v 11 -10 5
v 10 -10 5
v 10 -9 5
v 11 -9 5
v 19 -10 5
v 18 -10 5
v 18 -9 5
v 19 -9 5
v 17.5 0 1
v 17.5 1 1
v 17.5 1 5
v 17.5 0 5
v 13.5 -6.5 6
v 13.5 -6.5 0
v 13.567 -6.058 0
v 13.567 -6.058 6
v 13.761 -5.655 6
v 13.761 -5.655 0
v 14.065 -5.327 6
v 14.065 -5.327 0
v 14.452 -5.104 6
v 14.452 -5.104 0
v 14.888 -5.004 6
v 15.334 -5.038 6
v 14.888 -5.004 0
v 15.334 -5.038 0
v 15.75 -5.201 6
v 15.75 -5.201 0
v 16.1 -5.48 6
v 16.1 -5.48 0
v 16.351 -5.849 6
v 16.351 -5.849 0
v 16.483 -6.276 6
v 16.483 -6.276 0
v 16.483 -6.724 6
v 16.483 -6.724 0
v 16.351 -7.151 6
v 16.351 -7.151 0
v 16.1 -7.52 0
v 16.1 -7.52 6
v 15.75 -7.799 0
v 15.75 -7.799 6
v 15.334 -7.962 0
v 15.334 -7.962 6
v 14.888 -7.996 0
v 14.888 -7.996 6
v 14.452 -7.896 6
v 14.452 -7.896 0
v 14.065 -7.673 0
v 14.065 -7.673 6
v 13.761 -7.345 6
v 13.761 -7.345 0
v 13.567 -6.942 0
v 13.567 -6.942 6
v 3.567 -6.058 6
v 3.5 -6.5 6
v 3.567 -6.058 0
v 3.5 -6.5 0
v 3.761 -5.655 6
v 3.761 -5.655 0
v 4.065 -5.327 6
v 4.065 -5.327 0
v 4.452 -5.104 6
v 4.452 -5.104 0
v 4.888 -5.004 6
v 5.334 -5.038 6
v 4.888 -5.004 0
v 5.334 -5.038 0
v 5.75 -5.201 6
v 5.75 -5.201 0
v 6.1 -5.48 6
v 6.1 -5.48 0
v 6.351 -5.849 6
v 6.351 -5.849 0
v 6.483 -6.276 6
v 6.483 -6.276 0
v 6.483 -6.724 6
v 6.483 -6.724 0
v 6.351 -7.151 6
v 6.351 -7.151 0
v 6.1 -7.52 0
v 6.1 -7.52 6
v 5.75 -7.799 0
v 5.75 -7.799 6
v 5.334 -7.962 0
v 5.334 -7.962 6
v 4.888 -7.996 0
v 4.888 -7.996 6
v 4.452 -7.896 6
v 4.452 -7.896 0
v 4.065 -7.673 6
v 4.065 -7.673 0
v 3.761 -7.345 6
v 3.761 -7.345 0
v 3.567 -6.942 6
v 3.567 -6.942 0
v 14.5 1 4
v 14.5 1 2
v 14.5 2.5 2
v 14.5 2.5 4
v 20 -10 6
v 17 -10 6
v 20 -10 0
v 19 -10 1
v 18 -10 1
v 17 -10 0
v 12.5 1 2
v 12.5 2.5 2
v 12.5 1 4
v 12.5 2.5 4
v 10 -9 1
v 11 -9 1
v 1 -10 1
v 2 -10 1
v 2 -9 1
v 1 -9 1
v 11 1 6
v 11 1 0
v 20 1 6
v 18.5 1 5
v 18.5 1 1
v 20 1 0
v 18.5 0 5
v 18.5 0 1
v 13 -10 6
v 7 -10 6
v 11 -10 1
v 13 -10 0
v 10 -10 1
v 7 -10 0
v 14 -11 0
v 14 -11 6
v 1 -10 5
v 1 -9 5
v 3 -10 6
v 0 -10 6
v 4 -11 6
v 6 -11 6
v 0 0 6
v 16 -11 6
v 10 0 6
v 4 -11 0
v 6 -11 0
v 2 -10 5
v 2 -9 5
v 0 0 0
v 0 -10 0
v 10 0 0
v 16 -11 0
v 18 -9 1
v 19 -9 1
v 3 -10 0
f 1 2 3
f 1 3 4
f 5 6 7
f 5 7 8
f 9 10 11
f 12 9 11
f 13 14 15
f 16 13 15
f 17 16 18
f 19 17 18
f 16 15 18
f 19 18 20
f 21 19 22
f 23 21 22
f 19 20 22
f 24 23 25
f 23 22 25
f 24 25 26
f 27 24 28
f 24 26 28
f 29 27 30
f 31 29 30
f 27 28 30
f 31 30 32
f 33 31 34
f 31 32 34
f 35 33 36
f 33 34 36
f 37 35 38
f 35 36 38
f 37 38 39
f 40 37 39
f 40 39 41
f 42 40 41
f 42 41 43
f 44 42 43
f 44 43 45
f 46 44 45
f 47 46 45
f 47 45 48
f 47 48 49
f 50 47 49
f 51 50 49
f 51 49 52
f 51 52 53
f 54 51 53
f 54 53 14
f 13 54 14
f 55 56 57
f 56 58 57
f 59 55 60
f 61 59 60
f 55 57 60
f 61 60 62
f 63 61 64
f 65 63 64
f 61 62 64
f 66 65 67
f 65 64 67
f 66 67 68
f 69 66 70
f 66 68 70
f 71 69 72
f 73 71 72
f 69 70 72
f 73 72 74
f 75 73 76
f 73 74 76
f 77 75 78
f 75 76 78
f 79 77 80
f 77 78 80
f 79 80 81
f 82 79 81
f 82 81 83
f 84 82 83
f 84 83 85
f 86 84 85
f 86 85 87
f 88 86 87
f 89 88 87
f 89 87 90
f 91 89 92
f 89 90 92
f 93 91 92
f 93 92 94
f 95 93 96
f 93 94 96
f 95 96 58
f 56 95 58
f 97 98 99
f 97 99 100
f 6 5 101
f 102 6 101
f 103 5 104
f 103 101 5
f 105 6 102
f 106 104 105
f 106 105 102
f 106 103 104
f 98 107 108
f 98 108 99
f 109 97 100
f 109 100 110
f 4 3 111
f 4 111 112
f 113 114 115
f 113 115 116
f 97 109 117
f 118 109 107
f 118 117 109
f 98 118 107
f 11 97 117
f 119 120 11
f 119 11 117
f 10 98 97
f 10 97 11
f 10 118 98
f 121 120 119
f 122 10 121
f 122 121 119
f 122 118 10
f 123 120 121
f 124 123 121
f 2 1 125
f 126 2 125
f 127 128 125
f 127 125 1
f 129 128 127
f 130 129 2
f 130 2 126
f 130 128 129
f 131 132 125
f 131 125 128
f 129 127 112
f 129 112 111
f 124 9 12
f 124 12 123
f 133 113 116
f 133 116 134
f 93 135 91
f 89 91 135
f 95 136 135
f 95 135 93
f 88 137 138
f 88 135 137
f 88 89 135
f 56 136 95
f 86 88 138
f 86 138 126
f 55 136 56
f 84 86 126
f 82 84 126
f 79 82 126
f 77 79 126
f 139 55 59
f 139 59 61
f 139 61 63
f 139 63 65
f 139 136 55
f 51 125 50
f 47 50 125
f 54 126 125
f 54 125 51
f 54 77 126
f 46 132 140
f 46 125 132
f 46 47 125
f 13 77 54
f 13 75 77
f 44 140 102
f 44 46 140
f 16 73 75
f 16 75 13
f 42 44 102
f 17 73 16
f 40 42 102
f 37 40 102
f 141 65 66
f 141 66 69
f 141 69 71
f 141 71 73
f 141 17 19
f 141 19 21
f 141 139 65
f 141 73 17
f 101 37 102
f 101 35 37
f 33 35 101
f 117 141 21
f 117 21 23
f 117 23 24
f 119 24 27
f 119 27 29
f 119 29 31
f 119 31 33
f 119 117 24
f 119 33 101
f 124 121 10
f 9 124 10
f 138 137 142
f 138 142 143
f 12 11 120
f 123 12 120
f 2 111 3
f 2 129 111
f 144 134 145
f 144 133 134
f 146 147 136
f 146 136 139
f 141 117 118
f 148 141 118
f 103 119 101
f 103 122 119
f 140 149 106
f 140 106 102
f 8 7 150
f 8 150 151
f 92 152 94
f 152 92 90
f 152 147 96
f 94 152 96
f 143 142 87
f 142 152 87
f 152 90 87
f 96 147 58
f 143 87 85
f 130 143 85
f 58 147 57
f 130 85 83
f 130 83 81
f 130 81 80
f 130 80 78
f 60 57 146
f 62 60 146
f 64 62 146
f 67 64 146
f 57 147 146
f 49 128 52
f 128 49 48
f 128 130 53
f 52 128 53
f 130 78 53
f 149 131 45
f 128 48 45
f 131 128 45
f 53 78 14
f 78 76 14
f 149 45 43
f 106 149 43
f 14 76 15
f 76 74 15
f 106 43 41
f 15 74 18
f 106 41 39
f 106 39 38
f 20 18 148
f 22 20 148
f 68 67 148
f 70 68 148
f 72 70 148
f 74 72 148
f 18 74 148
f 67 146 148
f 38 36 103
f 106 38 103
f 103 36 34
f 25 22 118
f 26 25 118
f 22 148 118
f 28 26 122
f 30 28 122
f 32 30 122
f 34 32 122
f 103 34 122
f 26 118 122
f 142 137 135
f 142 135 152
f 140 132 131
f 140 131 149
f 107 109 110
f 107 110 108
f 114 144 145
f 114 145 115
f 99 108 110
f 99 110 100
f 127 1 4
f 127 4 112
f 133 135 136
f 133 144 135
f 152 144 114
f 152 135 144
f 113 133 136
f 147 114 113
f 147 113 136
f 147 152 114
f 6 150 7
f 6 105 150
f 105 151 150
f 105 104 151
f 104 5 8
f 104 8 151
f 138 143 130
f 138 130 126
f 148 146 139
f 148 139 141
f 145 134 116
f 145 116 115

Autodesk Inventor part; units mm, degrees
ref_plane "YZ Plane" through (0, 0, 0) normal (1, 0, 0) x (0, 1, 0)
ref_plane "XZ Plane" through (0, 0, 0) normal (0, 1, 0) x (-1, 0, 0)
ref_plane "XY Plane" through (0, 0, 0) normal (0, 0, 1) x (1, 0, 0)
sketch "Sketch1" plane through (0, 0, 0) normal (0, 0, 1) x (1, 0, 0)
  line L0 (0, 0) -> (20, 0)
  line L1 (20, 0) -> (20, -10)
  line L2 (20, -10) -> (0, -10)
  line L3 (0, -10) -> (0, 0)
  dimension "d0" = 20
  dimension "d1" = 10
extrude "Extrusion1" add sketch "Sketch1" along normal blind 6
sketch "Sketch2" plane through (0, 0, 0) normal (0, 1, 0) x (1, 0, 0)
  line L0 (20, 0) -> (20, -6) projected
  line L1 (20, 0) -> (10, 0)
  line L2 (10, 0) -> (10, -6)
  line L3 (10, -6) -> (20, -6)
  line L4 (20, -6) -> (20, 0)
  point P0 (0, 0)
  dimension "d4" = 10
extrude "Extrusion2" add sketch "Sketch2" along normal blind 1
chamfer "Chamfer2" distance 1 angle 45 1 edges at (10, 1, 3)
sketch "Sketch3" plane through (0, -10, 0) normal (0, -1, 0) x (1, 0, 0)
  line L0 (0, 6) -> (3, 6) construction
  line L1 (3, 6) -> (3, 0) construction
  line L2 (3, 0) -> (0, 0) construction
  line L3 (0, 0) -> (0, 6) construction
  line L4 (3, 6) -> (7, 6)
  line L5 (7, 6) -> (7, 0)
  line L6 (7, 0) -> (3, 0)
  line L7 (3, 0) -> (3, 6)
  line L8 (7, 6) -> (13, 6) construction
  line L9 (13, 6) -> (13, 0) construction
  line L10 (13, 0) -> (7, 0) construction
  line L11 (7, 0) -> (7, 6) construction
  line L12 (13, 6) -> (17, 6)
  line L13 (17, 6) -> (17, 0)
  line L14 (17, 0) -> (13, 0)
  line L15 (13, 0) -> (13, 6)
  dimension "d13" = 3
  dimension "d14" = 4
  dimension "d15" = 6
  dimension "d16" = 4
extrude "Extrusion3" add sketch "Sketch3" along normal blind 1
chamfer "Chamfer3" distance 1 angle 45 4 edges at (3, -11, 3) (7, -11, 3) (13, -11, 3) (17, -11, 3)
sketch "Sketch4" plane through (0, -10, 0) normal (0, -1, 0) x (1, 0, 0)
  line L0 (0, 6) -> (2.9323, 6) construction
  line L1 (0, 5) -> (2.9323, 5) construction
  line L2 (0, 0) -> (2.9323, 0) construction
  line L3 (2.9323, 1) -> (1, 1) construction
  line L4 (1, 1) -> (1, 5) construction
  line L5 (1, 5) -> (2.9323, 5) construction
  line L6 (2, 5) -> (2, 1) construction
  line L7 (1, 5) -> (2, 5)
  line L8 (2, 5) -> (2, 1)
  line L9 (2, 1) -> (1, 1)
  line L10 (1, 1) -> (1, 5)
  dimension "d22" = 1
  dimension "d23" = 1
  dimension "d24" = 1
extrude "Extrusion4" cut sketch "Sketch4" against normal blind 1
sketch "Sketch5" plane through (7, -10, 0) normal (0, -1, 0) x (1, 0, 0)
  line L0 (0, 0.2008) -> (0, 5.4827) construction
  line L1 (3, 0.2008) -> (3, 5.4827) construction
  line L2 (4, 0.2008) -> (4, 5.4827) construction
  line L3 (6, 0) -> (0.2208, 0) construction
  line L4 (6, 1) -> (0.2208, 1) construction
  line L5 (6, 6) -> (0.5976, 6) construction
  line L6 (6, 5) -> (0.5976, 5) construction
  line L7 (4, 1) -> (3, 1)
  line L8 (3, 1) -> (3, 5)
  line L9 (3, 5) -> (4, 5)
  line L10 (4, 5) -> (4, 1)
  point P0 (-7, 0)
  dimension "d27" = 3
  dimension "d28" = 1
  dimension "d29" = 1
  dimension "d30" = 1
extrude "Extrusion5" cut sketch "Sketch5" against normal blind 1
sketch "Sketch6" plane through (20, -10, 0) normal (0, -1, 0) x (1, 0, 0)
  line L0 (0, 0) -> (0, 5.7185) construction
  line L1 (-1, 0) -> (-1, 5.7185) construction
  line L2 (-2, 0) -> (-2, 5.7185) construction
  line L3 (-0.3844, 0) -> (-2.7356, 0) construction
  line L4 (-0.3844, 1) -> (-2.7356, 1) construction
  line L5 (-0.4485, 6) -> (-2.495, 6) construction
  line L6 (-0.4485, 5) -> (-2.495, 5) construction
  line L7 (-1, 1) -> (-2, 1)
  line L8 (-2, 1) -> (-2, 5)
  line L9 (-2, 5) -> (-1, 5)
  line L10 (-1, 5) -> (-1, 1)
  point P0 (-20, 0)
  dimension "d33" = 1
  dimension "d34" = 1
  dimension "d35" = 1
  dimension "d36" = 1
extrude "Extrusion6" cut sketch "Sketch6" against normal blind 1
sketch "Sketch7" plane through (0, 1, 0) normal (0, 1, 0) x (1, 0, 0)
  line L0 (11, -5.3093) -> (11, -0.576) construction
  line L1 (12.5, -5.3093) -> (12.5, -0.576) construction
  line L2 (14.5, -5.3093) -> (14.5, -0.576) construction
  line L3 (15, 0) -> (12.0712, 0) construction
  line L4 (15, -2) -> (12.0712, -2) construction
  line L5 (15, -4) -> (12.0712, -4) construction
  line L6 (14.5, -4) -> (12.5, -4)
  line L7 (12.5, -4) -> (12.5, -2)
  line L8 (12.5, -2) -> (14.5, -2)
  line L9 (14.5, -2) -> (14.5, -4)
  point P0 (0, 0)
  dimension "d39" = 1.5
  dimension "d40" = 2
  dimension "d41" = 2
  dimension "d42" = 2
extrude "Extrusion7" add sketch "Sketch7" along normal blind 1.5
sketch "Sketch8" plane through (0, 1, 0) normal (0, 1, 0) x (1, 0, 0)
  line L0 (14.5, -5.3842) -> (14.5, -1) construction
  line L1 (17.5, -5.3842) -> (17.5, -1) construction
  line L2 (18.8144, -6) -> (15.3684, -6) construction
  line L3 (18.8144, -5) -> (14.5, -5) construction
  line L4 (18.8144, -1) -> (14.5, -1) construction
  line L5 (17.5, -5) -> (18.5, -5)
  line L6 (18.5, -5) -> (18.5, -1)
  line L7 (18.5, -1) -> (17.5, -1)
  line L8 (17.5, -1) -> (17.5, -5)
  point P0 (0, 0)
  dimension "d45" = 3
  dimension "d47" = 1
  dimension "d48" = 4
  dimension "d49" = 1
extrude "Extrusion8" cut sketch "Sketch8" against normal blind 1
sketch "Sketch9" plane through (0, 0, 0) normal (0, 0, -1) x (-1, 0, 0)
  line L0 (-20, -10) -> (-0.9385, -10) construction
  line L1 (-20, -6.5) -> (-0.9385, -6.5) construction
  line L2 (-13, -10) -> (-14, -11) construction
  line L3 (-13, -10) -> (-13, -3.6474) construction
  line L4 (-3, -10) -> (-3, -3.6474) construction
  line L5 (-5, -10) -> (-5, -3.6474) construction
  line L6 (-15, -10) -> (-15, -3.6474) construction
  circle A0 centre (-15, -6.5) radius 1.5
  circle A1 centre (-5, -6.5) radius 1.5
  point P0 (0, 0)
  dimension "d52" = 3.5
  dimension "d53" = 2
  dimension "d54" = 2
  dimension "d55" = 3
  dimension "d56" = 3
extrude "Extrusion9" cut sketch "Sketch9" against normal blind 20
properties part number "Limit switch body"
